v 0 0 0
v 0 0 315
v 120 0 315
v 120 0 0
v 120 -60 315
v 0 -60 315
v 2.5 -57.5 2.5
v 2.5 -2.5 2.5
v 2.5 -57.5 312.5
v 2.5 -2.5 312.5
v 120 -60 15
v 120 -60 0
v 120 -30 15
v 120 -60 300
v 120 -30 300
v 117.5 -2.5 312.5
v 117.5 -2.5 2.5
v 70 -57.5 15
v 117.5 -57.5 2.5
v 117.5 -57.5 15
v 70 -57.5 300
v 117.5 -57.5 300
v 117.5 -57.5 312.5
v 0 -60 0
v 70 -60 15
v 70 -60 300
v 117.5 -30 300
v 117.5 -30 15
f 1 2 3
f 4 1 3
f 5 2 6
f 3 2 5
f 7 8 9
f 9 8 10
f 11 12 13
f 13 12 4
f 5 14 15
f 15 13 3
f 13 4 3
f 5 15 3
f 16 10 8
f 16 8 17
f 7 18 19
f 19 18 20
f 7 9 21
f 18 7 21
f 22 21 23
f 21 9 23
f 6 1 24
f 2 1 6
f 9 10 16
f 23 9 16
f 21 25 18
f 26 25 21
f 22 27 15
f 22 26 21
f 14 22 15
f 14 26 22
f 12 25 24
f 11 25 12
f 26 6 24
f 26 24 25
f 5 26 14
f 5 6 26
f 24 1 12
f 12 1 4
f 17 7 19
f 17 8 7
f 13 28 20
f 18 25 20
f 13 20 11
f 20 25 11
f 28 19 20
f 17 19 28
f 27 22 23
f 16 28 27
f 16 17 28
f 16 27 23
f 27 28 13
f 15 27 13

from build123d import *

# Parameters (mm, degrees)
F0_W     = 120
F0_H     = 315
F1_DEPTH = 60
F2_W     = 100
F2_H     = 285
F3_DEPTH = 30
F4_T     = -2.5


with BuildPart() as f1:
    # F0 (on Front) → F1 (new body)
    with BuildSketch(Plane.XZ):
        with Locations((60, 157.5)):
            Rectangle(F0_W, F0_H)
    extrude(amount=F1_DEPTH)

    # F2 (on face) → F3 (cut)
    with BuildSketch(Plane.XZ.offset(60)):
        with Locations((120, 157.5)):
            Rectangle(F2_W, F2_H)
    extrude(amount=-F3_DEPTH, mode=Mode.SUBTRACT)

    # F4
    f4_openings = [f1.faces().sort_by_distance(p)[0] for p in [
        (95, -45, 300),
        (70, -45, 157.5),
        (95, -30, 157.5),
        (95, -45, 15),
    ]]
    offset(amount=F4_T, openings=f4_openings)


solid = f1.part
